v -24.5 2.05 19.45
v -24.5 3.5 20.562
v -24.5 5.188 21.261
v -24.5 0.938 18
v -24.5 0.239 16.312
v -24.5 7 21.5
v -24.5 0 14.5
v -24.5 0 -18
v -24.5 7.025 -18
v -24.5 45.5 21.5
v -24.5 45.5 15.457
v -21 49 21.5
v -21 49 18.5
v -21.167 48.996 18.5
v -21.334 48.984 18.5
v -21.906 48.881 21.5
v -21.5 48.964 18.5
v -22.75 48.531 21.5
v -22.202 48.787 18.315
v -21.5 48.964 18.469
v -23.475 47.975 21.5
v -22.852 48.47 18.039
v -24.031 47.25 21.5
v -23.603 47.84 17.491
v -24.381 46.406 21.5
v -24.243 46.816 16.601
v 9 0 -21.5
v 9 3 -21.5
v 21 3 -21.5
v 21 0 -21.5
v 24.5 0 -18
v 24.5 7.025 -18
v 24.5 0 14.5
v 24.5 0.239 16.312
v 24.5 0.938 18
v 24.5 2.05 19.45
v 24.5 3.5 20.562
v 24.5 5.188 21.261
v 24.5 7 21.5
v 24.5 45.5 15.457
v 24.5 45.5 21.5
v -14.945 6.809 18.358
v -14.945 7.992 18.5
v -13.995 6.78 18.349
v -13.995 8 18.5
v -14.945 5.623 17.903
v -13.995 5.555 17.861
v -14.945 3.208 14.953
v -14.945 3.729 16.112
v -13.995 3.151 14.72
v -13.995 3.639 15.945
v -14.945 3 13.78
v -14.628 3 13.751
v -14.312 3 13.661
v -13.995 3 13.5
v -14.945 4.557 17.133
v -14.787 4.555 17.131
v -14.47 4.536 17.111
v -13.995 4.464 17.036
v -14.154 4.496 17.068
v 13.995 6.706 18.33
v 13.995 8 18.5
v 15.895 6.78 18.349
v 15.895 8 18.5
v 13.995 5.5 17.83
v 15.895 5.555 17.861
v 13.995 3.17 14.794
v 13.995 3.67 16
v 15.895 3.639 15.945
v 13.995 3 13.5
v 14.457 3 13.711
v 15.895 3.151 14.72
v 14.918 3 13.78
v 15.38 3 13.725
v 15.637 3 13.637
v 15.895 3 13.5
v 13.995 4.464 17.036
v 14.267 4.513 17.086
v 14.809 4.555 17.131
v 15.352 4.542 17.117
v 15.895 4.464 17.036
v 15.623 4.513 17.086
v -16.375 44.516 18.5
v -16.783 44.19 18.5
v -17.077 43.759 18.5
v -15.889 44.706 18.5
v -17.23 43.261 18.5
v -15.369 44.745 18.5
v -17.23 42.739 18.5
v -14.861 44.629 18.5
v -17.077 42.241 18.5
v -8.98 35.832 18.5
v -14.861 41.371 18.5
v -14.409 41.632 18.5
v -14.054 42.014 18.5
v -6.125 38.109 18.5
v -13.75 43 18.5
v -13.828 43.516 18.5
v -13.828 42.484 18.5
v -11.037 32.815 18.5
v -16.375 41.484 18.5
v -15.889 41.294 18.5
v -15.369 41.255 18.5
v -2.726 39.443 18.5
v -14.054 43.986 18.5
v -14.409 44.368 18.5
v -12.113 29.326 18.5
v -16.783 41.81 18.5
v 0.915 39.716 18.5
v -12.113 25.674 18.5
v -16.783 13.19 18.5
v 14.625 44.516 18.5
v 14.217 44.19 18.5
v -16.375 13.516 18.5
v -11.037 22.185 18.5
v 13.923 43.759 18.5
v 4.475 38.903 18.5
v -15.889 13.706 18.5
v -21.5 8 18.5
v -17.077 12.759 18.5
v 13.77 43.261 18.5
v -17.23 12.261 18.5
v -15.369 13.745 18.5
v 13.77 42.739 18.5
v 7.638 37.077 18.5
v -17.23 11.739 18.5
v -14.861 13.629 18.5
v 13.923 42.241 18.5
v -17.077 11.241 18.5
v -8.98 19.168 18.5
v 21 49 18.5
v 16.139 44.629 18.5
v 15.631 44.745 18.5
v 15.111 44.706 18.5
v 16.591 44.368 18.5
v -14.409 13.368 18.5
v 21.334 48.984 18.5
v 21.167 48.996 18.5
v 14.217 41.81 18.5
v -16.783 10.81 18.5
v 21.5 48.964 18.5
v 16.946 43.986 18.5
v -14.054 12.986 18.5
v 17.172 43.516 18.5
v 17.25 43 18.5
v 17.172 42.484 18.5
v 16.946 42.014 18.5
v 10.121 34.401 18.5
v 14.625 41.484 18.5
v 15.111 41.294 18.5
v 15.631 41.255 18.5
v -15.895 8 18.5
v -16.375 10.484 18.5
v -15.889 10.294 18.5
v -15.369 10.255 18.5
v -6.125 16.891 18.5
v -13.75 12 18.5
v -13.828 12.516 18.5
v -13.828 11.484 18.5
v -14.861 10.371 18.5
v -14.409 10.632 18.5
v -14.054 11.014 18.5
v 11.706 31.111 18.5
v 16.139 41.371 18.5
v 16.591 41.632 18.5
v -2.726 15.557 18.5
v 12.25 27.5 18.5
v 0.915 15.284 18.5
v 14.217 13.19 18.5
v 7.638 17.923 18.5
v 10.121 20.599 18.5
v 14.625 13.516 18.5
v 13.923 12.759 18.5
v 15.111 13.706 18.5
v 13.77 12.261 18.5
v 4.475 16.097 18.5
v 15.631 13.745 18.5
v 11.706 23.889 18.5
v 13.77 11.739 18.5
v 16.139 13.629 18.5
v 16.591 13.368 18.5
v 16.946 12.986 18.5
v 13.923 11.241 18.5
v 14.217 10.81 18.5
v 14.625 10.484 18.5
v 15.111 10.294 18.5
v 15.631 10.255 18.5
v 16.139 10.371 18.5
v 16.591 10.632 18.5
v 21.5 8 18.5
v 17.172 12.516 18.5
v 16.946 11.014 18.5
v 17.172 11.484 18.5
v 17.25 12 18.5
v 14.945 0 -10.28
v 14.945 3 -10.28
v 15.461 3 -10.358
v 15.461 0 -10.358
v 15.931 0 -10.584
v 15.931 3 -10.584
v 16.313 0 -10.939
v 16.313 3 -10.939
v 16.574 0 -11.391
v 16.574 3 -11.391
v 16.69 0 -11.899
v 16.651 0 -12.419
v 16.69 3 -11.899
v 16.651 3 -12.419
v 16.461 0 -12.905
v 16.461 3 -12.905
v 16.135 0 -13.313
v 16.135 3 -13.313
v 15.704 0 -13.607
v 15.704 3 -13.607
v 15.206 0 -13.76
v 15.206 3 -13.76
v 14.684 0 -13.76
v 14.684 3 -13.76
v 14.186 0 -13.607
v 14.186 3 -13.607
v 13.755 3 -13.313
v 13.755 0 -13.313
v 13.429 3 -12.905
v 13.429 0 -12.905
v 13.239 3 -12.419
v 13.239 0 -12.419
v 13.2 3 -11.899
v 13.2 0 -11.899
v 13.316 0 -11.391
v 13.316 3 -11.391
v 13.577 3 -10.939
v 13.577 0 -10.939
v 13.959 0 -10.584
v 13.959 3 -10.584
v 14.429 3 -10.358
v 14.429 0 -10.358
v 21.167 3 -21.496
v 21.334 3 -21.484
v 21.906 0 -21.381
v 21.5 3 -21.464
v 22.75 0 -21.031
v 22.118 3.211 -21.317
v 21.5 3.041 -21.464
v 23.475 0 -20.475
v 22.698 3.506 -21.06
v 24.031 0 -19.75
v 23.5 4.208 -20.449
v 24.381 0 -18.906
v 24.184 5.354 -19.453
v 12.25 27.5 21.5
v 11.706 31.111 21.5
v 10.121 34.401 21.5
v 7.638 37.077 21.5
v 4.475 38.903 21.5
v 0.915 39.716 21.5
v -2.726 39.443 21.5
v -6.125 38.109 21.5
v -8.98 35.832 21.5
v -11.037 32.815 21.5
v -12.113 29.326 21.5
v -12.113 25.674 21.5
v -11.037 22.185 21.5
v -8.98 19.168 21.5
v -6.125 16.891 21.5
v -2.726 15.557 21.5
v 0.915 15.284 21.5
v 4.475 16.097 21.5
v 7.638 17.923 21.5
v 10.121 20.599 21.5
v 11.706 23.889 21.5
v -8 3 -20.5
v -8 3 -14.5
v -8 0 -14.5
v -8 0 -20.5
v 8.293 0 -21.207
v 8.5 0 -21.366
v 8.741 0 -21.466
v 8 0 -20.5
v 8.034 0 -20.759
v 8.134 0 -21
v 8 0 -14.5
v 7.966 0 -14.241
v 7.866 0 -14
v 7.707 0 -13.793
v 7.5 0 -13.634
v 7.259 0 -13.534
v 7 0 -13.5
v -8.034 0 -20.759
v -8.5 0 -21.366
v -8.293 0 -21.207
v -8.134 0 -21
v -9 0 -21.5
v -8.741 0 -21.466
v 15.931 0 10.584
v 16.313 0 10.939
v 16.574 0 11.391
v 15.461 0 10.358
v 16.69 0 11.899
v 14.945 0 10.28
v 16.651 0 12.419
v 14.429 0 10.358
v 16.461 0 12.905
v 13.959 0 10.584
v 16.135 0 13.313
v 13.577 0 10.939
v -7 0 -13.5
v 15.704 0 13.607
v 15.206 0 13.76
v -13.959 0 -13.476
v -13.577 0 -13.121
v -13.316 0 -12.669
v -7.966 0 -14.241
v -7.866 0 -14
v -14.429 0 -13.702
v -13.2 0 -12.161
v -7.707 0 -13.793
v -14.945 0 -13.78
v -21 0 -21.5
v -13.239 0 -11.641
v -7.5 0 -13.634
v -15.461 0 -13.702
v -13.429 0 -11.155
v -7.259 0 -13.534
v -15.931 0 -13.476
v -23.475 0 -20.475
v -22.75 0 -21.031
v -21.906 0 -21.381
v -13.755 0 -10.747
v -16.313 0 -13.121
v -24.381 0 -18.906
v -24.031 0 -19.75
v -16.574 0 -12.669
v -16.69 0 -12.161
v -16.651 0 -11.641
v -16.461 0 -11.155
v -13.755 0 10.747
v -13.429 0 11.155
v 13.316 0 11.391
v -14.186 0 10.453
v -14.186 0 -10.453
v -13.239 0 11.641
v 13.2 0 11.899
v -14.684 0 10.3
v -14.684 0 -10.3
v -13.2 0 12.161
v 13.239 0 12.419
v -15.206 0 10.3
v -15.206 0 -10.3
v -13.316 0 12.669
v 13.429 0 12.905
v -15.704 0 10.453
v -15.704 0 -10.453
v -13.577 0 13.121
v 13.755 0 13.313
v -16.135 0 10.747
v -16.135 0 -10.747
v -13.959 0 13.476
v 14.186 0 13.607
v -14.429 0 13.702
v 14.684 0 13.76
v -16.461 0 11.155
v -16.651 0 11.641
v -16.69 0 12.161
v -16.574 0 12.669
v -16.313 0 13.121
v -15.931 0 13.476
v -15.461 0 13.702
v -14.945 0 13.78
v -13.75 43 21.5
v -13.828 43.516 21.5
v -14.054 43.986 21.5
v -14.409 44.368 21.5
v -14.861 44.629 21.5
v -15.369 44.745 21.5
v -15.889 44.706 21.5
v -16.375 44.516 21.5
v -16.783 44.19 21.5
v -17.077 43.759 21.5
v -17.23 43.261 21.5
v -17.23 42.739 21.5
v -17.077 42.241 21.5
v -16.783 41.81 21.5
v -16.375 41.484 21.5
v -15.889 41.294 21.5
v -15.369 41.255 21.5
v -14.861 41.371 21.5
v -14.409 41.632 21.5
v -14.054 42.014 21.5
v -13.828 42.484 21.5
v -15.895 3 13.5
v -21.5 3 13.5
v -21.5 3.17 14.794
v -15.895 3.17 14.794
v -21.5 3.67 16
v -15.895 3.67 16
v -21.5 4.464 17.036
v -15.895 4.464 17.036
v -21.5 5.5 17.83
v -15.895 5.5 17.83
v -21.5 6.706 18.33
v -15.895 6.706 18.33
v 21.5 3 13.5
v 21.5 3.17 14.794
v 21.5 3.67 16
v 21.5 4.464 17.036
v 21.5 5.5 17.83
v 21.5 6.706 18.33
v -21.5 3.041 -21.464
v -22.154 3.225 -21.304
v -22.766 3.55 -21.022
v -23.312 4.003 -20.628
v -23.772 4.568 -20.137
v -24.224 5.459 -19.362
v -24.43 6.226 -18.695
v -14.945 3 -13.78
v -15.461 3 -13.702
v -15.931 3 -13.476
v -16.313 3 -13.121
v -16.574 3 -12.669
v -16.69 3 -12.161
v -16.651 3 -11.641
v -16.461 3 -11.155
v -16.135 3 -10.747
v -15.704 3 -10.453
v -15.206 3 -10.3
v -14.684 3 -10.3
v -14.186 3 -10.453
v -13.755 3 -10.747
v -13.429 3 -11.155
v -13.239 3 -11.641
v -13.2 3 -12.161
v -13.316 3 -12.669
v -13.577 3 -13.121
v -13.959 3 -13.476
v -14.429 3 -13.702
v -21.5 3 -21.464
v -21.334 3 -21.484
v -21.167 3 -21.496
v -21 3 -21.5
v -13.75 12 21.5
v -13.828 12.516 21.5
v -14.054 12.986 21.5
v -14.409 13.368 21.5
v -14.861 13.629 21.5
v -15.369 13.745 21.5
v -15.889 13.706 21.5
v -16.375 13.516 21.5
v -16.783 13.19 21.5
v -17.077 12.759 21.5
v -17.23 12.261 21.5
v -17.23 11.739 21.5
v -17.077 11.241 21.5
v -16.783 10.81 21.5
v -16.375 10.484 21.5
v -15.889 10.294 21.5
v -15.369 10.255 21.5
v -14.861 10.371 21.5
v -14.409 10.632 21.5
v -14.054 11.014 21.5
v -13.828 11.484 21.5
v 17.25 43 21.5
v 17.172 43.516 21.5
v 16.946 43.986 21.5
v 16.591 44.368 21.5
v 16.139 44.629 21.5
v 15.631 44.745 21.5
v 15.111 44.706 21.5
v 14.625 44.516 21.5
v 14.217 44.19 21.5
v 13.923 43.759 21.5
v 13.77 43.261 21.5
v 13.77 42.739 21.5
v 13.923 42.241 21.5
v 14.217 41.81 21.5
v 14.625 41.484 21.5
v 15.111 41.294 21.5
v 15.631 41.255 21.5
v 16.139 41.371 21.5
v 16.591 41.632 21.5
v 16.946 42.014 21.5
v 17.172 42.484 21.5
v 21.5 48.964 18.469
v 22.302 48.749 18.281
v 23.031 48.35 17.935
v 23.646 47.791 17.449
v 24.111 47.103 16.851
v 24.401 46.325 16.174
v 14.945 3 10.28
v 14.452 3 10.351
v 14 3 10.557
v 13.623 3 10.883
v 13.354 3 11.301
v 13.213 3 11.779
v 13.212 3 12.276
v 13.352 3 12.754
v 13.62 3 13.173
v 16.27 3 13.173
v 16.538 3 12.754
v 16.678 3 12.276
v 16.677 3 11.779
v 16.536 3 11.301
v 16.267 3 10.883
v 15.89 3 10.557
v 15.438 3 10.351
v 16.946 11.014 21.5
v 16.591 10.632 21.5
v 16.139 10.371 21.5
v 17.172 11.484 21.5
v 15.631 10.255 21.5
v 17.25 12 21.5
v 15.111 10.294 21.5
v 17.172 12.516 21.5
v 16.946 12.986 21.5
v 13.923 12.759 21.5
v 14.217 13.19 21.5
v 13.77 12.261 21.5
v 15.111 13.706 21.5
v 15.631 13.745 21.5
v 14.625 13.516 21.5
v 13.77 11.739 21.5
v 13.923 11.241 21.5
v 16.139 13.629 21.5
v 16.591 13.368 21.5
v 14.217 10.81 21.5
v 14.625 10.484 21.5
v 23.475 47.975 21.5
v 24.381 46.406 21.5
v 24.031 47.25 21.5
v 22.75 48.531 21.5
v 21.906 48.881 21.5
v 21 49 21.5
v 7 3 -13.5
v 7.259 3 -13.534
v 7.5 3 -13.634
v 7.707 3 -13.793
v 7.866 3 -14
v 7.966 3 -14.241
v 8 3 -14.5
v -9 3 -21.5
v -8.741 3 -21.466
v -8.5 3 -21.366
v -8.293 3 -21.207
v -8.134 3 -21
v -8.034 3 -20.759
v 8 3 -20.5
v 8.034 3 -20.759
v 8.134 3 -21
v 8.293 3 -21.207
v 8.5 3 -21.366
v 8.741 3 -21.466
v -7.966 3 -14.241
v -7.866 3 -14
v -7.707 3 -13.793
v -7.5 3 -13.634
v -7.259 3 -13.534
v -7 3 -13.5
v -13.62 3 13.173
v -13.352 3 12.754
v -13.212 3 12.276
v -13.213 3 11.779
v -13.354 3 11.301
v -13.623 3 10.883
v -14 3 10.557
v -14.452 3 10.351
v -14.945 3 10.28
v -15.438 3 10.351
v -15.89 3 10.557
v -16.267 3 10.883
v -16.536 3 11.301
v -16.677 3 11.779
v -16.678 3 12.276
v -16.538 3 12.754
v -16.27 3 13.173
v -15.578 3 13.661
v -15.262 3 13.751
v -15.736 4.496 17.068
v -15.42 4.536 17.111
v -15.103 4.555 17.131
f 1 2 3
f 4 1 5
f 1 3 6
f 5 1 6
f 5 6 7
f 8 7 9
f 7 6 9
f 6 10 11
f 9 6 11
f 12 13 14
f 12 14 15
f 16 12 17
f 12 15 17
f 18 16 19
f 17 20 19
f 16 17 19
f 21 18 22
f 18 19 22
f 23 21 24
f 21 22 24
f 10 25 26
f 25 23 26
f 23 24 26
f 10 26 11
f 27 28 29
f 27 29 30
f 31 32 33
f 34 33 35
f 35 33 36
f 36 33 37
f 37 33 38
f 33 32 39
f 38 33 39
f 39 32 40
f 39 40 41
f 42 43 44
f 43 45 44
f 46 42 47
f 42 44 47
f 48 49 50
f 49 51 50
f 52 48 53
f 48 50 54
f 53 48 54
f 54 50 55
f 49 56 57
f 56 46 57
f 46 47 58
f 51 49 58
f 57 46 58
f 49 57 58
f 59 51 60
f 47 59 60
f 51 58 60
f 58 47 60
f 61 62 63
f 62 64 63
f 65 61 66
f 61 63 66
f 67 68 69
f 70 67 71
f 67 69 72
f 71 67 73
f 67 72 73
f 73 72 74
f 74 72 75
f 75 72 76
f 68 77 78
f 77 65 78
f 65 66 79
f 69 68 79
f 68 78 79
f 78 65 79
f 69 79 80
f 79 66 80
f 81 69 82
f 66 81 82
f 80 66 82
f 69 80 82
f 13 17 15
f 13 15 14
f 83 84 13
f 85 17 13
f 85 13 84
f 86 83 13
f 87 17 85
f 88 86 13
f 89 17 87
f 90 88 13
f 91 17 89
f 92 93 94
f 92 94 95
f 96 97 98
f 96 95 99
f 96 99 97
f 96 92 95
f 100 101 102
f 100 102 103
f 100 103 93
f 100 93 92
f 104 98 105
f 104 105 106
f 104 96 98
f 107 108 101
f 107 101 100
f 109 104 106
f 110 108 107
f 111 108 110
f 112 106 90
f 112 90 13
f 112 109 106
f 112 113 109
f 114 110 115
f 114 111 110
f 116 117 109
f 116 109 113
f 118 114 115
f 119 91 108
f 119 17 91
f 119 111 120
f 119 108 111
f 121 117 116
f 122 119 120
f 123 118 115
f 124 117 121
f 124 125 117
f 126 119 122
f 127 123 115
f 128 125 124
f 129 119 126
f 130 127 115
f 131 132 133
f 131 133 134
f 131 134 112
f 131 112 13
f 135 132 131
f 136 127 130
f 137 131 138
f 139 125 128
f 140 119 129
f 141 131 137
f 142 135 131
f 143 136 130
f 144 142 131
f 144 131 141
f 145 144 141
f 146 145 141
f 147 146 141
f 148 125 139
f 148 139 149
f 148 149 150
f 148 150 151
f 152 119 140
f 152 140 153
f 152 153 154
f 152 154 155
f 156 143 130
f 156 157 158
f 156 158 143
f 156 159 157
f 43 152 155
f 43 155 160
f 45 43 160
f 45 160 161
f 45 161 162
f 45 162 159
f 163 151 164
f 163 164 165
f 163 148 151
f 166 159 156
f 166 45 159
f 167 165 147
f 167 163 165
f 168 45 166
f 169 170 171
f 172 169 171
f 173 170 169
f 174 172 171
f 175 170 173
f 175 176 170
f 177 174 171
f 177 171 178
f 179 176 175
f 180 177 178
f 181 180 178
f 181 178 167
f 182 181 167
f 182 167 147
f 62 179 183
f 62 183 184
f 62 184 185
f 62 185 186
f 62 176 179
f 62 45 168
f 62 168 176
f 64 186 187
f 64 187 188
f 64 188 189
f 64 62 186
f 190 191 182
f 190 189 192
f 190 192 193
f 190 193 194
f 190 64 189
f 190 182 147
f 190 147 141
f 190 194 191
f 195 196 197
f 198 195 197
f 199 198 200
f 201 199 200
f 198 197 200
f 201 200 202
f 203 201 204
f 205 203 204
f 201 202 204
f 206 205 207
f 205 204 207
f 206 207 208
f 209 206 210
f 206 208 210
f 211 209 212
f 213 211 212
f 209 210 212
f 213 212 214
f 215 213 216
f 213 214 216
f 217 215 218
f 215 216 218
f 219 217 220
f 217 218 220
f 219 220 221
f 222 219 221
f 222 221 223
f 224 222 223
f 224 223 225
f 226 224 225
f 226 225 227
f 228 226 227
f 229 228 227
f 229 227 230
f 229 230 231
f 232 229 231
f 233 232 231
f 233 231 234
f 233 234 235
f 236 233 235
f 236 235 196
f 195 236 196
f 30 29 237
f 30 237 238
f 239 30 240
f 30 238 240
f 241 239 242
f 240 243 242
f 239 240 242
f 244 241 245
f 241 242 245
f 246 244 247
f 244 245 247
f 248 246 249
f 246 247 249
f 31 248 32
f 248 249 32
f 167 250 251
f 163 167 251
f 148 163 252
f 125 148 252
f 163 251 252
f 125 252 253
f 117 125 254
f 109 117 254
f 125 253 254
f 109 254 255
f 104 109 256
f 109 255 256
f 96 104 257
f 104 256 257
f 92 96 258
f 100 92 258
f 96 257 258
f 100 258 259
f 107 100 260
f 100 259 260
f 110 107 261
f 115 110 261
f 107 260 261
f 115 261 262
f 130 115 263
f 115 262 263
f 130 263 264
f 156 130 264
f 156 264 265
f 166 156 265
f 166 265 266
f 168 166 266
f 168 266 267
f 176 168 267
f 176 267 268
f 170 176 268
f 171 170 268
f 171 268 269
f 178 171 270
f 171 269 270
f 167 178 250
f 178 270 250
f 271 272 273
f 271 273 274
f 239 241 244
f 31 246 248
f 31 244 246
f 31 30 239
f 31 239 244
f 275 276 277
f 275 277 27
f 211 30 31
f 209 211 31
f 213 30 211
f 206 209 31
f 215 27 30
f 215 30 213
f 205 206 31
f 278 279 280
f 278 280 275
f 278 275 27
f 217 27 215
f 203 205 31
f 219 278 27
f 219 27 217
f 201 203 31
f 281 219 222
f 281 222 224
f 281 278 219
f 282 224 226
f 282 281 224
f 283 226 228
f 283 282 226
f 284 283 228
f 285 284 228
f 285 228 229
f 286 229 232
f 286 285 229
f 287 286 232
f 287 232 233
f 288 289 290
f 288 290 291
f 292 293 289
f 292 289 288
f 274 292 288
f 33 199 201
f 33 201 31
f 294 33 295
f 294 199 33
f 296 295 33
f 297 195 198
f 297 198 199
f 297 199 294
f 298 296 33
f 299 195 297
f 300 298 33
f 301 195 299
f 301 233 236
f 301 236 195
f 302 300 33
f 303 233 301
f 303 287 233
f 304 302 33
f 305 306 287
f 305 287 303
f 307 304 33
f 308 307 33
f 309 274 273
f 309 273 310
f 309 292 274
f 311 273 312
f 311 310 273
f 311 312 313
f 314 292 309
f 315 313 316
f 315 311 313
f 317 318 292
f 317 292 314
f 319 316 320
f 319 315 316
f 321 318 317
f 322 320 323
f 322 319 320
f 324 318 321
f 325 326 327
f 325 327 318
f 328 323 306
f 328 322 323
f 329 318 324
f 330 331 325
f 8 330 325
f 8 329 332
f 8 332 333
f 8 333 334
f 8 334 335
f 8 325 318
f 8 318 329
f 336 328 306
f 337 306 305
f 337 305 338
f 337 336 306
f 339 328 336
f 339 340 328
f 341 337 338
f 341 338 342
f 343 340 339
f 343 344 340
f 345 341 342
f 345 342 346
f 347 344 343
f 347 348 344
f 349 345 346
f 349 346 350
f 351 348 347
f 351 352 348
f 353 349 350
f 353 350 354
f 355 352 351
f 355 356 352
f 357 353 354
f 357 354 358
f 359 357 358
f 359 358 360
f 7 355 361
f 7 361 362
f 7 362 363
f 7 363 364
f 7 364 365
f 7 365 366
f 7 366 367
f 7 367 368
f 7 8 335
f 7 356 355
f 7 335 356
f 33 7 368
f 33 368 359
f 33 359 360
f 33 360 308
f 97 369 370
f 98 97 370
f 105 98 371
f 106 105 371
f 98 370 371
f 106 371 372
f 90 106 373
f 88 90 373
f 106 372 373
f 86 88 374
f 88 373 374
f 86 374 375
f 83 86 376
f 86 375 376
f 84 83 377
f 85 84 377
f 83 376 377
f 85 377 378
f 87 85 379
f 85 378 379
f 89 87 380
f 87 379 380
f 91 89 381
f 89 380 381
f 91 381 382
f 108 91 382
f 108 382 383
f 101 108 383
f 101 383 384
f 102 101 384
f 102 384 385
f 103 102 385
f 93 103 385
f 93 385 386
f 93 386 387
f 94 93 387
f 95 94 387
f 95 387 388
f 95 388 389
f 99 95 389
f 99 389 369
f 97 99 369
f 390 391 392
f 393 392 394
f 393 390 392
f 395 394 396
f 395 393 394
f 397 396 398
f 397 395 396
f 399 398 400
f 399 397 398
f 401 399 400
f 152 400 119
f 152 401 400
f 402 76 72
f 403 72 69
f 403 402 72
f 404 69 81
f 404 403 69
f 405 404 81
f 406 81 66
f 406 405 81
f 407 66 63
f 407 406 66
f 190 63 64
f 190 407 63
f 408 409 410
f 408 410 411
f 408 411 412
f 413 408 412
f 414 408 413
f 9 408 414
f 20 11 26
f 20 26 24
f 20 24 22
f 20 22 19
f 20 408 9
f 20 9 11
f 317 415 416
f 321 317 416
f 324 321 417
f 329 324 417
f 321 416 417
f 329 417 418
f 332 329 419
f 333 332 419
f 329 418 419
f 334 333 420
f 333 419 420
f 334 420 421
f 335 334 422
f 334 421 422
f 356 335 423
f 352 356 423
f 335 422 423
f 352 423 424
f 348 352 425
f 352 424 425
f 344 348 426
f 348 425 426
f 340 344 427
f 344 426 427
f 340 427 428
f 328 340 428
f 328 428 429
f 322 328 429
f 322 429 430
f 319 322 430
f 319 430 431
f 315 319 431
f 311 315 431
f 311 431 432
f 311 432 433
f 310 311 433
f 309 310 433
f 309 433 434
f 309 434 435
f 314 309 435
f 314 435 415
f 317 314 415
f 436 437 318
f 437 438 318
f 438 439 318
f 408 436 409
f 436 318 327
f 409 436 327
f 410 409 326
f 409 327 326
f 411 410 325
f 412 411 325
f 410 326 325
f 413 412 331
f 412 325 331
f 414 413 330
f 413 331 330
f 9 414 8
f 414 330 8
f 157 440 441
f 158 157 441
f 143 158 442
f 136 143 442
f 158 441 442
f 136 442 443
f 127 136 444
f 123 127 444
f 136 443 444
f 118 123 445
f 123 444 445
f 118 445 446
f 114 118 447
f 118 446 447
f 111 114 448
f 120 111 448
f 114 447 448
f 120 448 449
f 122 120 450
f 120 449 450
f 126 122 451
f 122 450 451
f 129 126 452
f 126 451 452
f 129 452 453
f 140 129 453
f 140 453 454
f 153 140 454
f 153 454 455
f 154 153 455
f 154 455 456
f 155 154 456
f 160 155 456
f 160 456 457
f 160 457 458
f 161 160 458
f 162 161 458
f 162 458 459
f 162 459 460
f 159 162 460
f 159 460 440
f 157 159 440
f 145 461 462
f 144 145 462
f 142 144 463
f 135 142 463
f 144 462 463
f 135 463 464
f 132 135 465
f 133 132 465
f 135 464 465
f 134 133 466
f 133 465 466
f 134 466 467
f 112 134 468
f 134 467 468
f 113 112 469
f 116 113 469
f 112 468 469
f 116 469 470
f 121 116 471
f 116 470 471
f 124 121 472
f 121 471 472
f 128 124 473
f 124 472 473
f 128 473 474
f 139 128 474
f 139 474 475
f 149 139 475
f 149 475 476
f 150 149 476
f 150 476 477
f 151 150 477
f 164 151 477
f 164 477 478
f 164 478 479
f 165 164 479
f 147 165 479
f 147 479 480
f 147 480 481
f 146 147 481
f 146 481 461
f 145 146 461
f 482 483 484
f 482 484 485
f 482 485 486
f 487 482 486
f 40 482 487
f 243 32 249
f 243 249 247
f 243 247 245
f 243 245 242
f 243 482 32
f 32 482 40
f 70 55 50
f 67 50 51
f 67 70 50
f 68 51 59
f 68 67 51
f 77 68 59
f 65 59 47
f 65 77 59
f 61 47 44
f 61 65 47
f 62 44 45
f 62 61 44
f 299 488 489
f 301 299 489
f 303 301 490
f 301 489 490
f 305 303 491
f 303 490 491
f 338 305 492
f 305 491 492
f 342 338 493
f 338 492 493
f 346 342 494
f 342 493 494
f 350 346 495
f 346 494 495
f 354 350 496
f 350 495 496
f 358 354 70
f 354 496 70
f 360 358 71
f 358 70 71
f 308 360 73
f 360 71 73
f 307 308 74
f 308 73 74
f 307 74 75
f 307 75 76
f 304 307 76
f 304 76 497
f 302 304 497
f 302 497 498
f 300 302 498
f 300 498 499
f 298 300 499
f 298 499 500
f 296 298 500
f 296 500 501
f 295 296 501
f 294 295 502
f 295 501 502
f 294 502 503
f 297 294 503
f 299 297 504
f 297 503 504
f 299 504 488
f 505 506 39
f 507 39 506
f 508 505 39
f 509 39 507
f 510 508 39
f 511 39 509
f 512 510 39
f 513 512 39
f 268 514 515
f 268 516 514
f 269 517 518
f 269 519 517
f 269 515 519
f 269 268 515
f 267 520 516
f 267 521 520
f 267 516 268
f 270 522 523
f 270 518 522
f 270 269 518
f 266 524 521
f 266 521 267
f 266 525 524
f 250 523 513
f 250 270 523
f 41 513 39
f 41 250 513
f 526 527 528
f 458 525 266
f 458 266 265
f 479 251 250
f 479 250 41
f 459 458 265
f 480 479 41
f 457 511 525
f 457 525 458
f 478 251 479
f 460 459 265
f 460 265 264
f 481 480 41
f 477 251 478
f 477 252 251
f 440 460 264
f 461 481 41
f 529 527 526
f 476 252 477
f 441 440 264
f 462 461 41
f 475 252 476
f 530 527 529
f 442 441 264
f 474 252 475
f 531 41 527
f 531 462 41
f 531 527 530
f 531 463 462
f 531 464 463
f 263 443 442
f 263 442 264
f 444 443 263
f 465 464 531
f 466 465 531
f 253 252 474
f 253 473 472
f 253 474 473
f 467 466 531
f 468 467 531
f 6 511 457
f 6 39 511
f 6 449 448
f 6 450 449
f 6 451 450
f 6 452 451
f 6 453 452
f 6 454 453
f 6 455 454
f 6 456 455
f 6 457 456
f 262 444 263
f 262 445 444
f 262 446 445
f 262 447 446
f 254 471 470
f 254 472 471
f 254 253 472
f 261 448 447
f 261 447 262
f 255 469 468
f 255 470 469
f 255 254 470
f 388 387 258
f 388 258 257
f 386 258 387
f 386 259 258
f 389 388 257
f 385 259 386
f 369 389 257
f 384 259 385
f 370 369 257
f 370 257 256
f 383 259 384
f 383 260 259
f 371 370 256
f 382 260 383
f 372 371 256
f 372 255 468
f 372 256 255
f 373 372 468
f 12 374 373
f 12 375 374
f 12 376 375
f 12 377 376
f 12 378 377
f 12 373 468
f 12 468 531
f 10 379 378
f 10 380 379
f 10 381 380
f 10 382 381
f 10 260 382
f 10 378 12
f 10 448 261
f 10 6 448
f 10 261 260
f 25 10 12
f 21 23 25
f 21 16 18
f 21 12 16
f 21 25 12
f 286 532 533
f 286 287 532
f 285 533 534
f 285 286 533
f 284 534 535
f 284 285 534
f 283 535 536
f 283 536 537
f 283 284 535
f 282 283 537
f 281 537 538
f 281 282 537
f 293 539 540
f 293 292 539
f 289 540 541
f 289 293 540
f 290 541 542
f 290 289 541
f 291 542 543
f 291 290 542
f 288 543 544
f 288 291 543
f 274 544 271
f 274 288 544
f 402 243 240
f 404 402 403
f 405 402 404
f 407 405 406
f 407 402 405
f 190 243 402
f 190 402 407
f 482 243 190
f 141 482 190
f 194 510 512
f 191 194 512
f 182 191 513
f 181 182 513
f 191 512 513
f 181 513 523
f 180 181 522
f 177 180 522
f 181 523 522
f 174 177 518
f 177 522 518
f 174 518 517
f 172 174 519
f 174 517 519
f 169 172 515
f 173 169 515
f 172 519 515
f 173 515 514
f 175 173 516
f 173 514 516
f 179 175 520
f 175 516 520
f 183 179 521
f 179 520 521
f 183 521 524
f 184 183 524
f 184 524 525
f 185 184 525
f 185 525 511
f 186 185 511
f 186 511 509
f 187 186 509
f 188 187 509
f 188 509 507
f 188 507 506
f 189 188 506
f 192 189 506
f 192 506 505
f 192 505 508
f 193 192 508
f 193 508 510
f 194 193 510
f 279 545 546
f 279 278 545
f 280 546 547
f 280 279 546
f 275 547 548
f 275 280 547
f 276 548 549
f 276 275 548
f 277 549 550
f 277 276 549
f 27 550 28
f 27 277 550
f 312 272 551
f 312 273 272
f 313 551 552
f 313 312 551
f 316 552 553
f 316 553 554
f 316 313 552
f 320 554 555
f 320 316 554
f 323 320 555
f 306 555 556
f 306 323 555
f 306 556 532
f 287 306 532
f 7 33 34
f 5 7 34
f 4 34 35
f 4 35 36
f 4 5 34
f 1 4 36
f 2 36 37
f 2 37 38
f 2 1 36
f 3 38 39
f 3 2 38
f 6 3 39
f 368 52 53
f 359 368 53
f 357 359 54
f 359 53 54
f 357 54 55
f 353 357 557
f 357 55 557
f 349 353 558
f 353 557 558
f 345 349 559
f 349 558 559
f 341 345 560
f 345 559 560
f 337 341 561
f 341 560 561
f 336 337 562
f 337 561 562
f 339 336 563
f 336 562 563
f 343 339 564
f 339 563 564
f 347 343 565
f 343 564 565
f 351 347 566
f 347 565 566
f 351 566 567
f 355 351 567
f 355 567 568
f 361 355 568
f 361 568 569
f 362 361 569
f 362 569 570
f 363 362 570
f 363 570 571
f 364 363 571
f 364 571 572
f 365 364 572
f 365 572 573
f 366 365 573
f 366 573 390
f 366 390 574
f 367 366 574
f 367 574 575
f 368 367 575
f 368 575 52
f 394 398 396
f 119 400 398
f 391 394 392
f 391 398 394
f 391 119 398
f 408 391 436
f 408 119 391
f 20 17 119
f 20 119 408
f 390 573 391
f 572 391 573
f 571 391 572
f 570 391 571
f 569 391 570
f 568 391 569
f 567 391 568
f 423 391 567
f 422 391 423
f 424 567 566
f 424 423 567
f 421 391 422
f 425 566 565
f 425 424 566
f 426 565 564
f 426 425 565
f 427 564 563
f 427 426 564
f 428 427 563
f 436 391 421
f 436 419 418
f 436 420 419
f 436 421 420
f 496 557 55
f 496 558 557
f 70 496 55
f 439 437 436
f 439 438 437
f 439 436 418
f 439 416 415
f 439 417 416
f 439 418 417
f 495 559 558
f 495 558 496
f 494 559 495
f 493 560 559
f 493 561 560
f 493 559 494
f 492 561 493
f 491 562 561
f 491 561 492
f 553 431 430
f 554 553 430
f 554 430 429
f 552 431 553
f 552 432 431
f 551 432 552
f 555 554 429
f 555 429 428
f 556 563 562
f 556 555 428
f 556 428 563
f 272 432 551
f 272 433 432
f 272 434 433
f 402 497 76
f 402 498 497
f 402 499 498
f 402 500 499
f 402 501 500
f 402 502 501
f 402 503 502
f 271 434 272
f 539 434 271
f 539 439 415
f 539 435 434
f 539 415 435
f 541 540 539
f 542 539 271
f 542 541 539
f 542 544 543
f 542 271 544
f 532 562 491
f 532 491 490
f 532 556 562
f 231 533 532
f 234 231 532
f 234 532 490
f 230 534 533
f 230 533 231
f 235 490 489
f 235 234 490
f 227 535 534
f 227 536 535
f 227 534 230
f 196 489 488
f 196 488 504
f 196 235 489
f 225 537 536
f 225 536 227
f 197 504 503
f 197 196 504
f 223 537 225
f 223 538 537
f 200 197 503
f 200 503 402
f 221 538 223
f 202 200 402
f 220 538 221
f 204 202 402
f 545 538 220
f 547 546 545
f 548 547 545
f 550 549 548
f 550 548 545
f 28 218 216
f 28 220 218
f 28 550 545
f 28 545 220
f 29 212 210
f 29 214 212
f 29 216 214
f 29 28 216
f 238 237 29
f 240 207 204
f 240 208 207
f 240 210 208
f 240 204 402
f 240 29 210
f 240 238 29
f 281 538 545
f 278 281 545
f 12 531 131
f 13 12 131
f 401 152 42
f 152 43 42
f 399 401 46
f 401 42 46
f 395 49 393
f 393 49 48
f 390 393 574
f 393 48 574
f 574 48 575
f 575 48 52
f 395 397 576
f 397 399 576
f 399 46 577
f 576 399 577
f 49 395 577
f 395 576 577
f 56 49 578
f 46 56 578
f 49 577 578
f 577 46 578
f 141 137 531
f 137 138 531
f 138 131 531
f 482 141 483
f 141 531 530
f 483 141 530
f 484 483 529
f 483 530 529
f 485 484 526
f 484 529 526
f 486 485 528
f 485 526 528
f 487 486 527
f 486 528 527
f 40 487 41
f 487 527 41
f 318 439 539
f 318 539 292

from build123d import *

# Parameters (mm, degrees)
ESBO_O1_W                = 43
ESBO_O1_H                = 43
RESSALTO_EXTRUS_O1_DEPTH = 3
ESBO_O2_W                = 43
ESBO_O2_H                = 3
RESSALTO_EXTRUS_O2_DEPTH = 46
ESBO_O3_R                = 1.75
CORTE_EXTRUS_O1_DEPTH    = 56.140729048
ESBO_O4_R                = 1.75
CORTE_EXTRUS_O2_DEPTH    = 69.645830172
RESSALTO_EXTRUS_O3_DEPTH = 3
RESSALTO_EXTRUS_O4_DEPTH = 3
ESBO_O7_R                = 12.25
CORTE_EXTRUS_O3_DEPTH    = 3
FILETE1_R                = 3.5
FILETE2_R                = 7
FILETE3_R                = 3.5
FILETE4_R                = 5
ESBO_O8_W                = 16
ESBO_O8_H                = 8
CORTE_EXTRUS_O4_DEPTH    = 57.378187353
FILETE5_R                = 1


with BuildPart() as part:
    # Esboço1 → Ressalto-extrusão1 (new body)
    with BuildSketch(Plane(origin=(0, 0, 0), x_dir=(1, 0, 0), z_dir=(0, 1, 0))):
        Rectangle(ESBO_O1_W, ESBO_O1_H)
    extrude(amount=RESSALTO_EXTRUS_O1_DEPTH)

    # Esboço2 → Ressalto-extrusão2 (add)
    with BuildSketch(Plane(origin=(0, 3, 0), x_dir=(1, 0, 0), z_dir=(0, 1, 0))):
        with Locations((0, -20)):
            Rectangle(ESBO_O2_W, ESBO_O2_H)
    extrude(amount=RESSALTO_EXTRUS_O2_DEPTH)

    # Esboço3 → Corte-extrusão1 (cut, through all)
    with BuildSketch(Plane(origin=(0, 3, 0), x_dir=(1, 0, 0), z_dir=(0, 1, 0))):
        with Locations(Location((14.945, 12.03, 0), (0, 0, 270))):
            Circle(ESBO_O3_R)
        with Locations(Location((14.945, -12.03, 0), (0, 0, 90))):
            Circle(ESBO_O3_R)
        with Locations(Location((-14.945, -12.03, 0), (0, 0, 270))):
            Circle(ESBO_O3_R)
        with Locations(Location((-14.945, 12.03, 0), (0, 0, 90))):
            Circle(ESBO_O3_R)
    extrude(amount=-CORTE_EXTRUS_O1_DEPTH, mode=Mode.SUBTRACT)

    # Esboço4 → Corte-extrusão2 (cut, through all)
    with BuildSketch(Plane.XY.offset(21.5)):
        with Locations((-15.5, 43)):
            Circle(ESBO_O4_R)
        with Locations((15.5, 43)):
            Circle(ESBO_O4_R)
        with Locations((-15.5, 12)):
            Circle(ESBO_O4_R)
        with Locations((15.5, 12)):
            Circle(ESBO_O4_R)
    extrude(amount=-CORTE_EXTRUS_O2_DEPTH, mode=Mode.SUBTRACT)

    # Esboço5 → Ressalto-extrusão3 (add)
    with BuildSketch(Plane.ZY.offset(21.5)):
        Polygon((-21.5, 0), (-21.5, 3), (18.5, 49), (21.5, 49), (21.5, 0), align=None)
    extrude(amount=RESSALTO_EXTRUS_O3_DEPTH)

    # Esboço6 → Ressalto-extrusão4 (add)
    with BuildSketch(Plane(origin=(21.5, 0, 0), x_dir=(0, 0, -1), z_dir=(1, 0, 0))):
        Polygon((21.5, 0), (-21.5, 0), (-21.5, 49), (-18.5, 49), (21.5, 3), align=None)
    extrude(amount=RESSALTO_EXTRUS_O4_DEPTH)

    # Esboço7 → Corte-extrusão3 (cut)
    with BuildSketch(Plane.XY.offset(21.5)):
        with Locations((0, 27.5)):
            Circle(ESBO_O7_R)
    extrude(amount=-CORTE_EXTRUS_O3_DEPTH, mode=Mode.SUBTRACT)

    # Filete1
    # the kernel refuses this fillet: 3.5 mm, written as the material it takes off along each edge
    with BuildSketch(Plane(origin=(-24.5, 49, 9.75), x_dir=(1, 0, 0), z_dir=(0, 0, 1)), Plane(origin=(24.5, 49, 30.25), x_dir=(-1, 0, 0), z_dir=(0, 0, -1))) as filete1_piece_1:
        with BuildLine():
            CenterArc((FILETE1_R, -FILETE1_R), FILETE1_R, 90, 90)
            Line((0, -FILETE1_R), (0, 0))
            Line((0, 0), (FILETE1_R, 0))
        make_face()
    extrude(amount=20.5, mode=Mode.SUBTRACT)

    # Filete2
    filete2_edges = [part.edges().sort_by_distance(p)[0] for p in [
        (0, 0, 21.5),
    ]]
    fillet(filete2_edges, radius=FILETE2_R)

    # Filete3
    # the kernel refuses this fillet: 3.5 mm, written as the material it takes off along each edge
    with BuildSketch(Plane(origin=(-24.5, -8.75, -21.5), x_dir=(0, 0, 1), z_dir=(0, 1, 0)), Plane(origin=(24.5, 11.75, -21.5), x_dir=(0, 0, 1), z_dir=(0, -1, 0))) as filete3_piece_1:
        with BuildLine():
            CenterArc((FILETE3_R, FILETE3_R), FILETE3_R, 180, 90)
            Line((0, FILETE3_R), (0, 0))
            Line((0, 0), (FILETE3_R, 0))
        make_face()
    extrude(amount=20.5, mode=Mode.SUBTRACT)

    # Filete4
    filete4_edges = [part.edges().sort_by_distance(p)[0] for p in [
        (0, 3, 18.5),
    ]]
    fillet(filete4_edges, radius=FILETE4_R)

    # Esboço8 → Corte-extrusão4 (cut, through all)
    with BuildSketch(Plane(origin=(0, 3, 0), x_dir=(1, 0, 0), z_dir=(0, 1, 0))):
        with Locations((0, 17.5)):
            Rectangle(ESBO_O8_W, ESBO_O8_H)
    extrude(amount=-CORTE_EXTRUS_O4_DEPTH, mode=Mode.SUBTRACT)

    # Filete5
    filete5_edges = [part.edges().sort_by_distance(p)[0] for p in [
        (-8, 1.5, -21.5),
        (8, 1.5, -21.5),
        (8, 1.5, -13.5),
        (-8, 1.5, -13.5),
    ]]
    fillet(filete5_edges, radius=FILETE5_R)


solid = part.part
